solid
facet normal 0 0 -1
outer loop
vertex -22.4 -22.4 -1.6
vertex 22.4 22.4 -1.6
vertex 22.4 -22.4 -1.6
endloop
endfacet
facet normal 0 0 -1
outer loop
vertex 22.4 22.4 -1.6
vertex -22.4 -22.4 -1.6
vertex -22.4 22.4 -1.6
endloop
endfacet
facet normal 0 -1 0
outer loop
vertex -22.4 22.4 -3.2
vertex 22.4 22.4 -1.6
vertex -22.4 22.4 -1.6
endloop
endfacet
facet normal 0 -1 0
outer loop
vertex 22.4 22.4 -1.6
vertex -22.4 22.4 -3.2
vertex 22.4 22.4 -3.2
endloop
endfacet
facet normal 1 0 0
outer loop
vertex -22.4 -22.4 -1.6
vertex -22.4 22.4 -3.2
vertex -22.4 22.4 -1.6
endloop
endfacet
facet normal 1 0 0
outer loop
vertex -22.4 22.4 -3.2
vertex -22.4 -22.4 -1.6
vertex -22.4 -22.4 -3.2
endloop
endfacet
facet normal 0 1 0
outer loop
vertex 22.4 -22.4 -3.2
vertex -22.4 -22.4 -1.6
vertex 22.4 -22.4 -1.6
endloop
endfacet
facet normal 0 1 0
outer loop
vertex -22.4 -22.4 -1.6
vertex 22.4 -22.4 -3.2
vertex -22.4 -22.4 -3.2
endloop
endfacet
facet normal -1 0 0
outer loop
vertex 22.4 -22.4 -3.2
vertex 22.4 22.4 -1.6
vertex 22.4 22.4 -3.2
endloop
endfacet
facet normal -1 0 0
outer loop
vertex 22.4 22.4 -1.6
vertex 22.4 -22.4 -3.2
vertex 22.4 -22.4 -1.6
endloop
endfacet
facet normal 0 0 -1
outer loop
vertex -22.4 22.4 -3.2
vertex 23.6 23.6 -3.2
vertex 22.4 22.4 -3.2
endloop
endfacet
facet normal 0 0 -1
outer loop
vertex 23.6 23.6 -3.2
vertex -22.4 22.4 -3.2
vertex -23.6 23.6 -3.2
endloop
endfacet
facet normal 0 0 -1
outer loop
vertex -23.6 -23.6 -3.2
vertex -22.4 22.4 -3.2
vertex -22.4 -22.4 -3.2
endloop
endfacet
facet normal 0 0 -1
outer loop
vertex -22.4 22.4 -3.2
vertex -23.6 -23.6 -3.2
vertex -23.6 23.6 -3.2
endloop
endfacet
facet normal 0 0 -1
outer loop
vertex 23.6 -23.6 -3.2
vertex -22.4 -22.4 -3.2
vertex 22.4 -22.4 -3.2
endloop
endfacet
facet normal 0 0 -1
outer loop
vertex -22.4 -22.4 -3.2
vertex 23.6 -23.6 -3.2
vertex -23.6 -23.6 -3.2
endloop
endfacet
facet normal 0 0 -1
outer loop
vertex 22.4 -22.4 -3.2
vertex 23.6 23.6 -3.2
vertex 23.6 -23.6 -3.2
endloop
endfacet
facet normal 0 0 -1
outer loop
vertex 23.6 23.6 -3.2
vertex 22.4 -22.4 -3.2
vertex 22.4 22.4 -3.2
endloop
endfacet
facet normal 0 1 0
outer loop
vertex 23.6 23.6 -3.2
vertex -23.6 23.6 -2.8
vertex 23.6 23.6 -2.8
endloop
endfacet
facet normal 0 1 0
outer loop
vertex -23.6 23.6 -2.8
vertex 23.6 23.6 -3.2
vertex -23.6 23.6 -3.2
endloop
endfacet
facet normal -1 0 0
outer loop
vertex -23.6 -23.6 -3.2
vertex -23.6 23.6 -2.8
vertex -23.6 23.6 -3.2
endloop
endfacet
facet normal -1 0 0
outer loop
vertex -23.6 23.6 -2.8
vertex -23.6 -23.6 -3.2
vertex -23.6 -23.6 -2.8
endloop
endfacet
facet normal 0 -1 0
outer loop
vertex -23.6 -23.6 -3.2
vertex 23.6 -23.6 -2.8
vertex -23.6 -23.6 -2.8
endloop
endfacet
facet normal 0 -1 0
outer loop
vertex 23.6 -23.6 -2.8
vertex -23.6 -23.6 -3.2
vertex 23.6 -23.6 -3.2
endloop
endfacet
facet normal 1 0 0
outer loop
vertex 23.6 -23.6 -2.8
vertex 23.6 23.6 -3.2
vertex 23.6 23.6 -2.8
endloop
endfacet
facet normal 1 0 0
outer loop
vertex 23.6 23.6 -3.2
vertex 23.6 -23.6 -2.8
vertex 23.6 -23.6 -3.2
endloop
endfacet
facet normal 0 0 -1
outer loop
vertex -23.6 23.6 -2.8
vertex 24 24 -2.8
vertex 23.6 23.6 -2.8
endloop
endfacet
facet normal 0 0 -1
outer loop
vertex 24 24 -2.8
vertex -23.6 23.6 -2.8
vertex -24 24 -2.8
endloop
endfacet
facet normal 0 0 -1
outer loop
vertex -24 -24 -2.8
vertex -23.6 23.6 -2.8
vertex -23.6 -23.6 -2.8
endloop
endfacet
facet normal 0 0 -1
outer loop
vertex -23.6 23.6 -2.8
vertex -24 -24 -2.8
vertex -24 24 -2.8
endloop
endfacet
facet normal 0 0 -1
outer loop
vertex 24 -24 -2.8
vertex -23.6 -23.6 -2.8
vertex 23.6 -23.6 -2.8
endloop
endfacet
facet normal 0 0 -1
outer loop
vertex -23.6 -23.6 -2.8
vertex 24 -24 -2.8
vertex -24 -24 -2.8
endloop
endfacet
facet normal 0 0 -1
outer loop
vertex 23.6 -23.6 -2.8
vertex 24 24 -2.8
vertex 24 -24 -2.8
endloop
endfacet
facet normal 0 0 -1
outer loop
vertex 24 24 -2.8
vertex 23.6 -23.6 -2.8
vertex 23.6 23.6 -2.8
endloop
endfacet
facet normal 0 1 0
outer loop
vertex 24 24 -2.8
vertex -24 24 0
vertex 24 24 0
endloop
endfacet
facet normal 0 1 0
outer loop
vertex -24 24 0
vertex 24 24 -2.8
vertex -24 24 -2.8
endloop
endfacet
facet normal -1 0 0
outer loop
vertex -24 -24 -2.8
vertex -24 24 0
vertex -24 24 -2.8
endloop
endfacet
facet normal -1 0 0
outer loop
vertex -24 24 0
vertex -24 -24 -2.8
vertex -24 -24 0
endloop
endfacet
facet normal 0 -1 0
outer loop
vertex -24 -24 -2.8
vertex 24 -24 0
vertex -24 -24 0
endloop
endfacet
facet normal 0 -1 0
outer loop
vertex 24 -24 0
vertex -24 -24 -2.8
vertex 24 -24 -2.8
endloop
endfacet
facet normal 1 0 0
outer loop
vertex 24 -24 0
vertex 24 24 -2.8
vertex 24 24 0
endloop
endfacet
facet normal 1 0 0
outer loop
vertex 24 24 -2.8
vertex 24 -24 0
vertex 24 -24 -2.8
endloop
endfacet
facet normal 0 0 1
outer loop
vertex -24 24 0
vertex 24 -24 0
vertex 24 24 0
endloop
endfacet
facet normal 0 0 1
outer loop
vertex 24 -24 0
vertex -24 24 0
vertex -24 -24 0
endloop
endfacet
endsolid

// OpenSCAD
// file: ../p/box5.scad
use <../lib.scad>
function ldraw_lib__box5() = [
// 0 Box with 5 Faces and All Edges
// 0 Name: box5.dat
// 0 Author: James Jessiman
// 0 !LDRAW_ORG Primitive UPDATE 2012-01
// 0 !LICENSE Licensed under CC BY 4.0 : see CAreadme.txt
// 
// 0 BFC CERTIFY CCW
  [0,"BFC","CERTIFY"],
  [0,"BFC","CCW"],
// 
// 0 !HISTORY 2002-04-03 [sbliss] Modified for BFC compliance
// 0 !HISTORY 2002-04-25 [PTadmin] Official Update 2002-02
// 0 !HISTORY 2007-06-24 [PTadmin] Header formatted for Contributor Agreement
// 0 !HISTORY 2008-07-01 [PTadmin] Official Update 2008-01
// 0 !HISTORY 2012-02-16 [Philo] Changed to CCW
// 0 !HISTORY 2012-03-30 [PTadmin] Official Update 2012-01
// 
// 
// 2 24 1 1 1 -1 1 1
  [2,24,1,1,1,-1,1,1],
// 2 24 -1 1 1 -1 1 -1
  [2,24,-1,1,1,-1,1,-1],
// 2 24 -1 1 -1 1 1 -1
  [2,24,-1,1,-1,1,1,-1],
// 2 24 1 1 -1 1 1 1
  [2,24,1,1,-1,1,1,1],
// 2 24 1 0 1 -1 0 1
  [2,24,1,0,1,-1,0,1],
// 2 24 -1 0 1 -1 0 -1
  [2,24,-1,0,1,-1,0,-1],
// 2 24 -1 0 -1 1 0 -1
  [2,24,-1,0,-1,1,0,-1],
// 2 24 1 0 -1 1 0 1
  [2,24,1,0,-1,1,0,1],
// 2 24 1 0 1 1 1 1
  [2,24,1,0,1,1,1,1],
// 2 24 -1 0 1 -1 1 1
  [2,24,-1,0,1,-1,1,1],
// 2 24 1 0 -1 1 1 -1
  [2,24,1,0,-1,1,1,-1],
// 2 24 -1 0 -1 -1 1 -1
  [2,24,-1,0,-1,-1,1,-1],
// 4 16 -1 1 1 1 1 1 1 1 -1 -1 1 -1
  [4,16,-1,1,1,1,1,1,1,1,-1,-1,1,-1],
// 4 16 -1 1 1 -1 0 1 1 0 1 1 1 1
  [4,16,-1,1,1,-1,0,1,1,0,1,1,1,1],
// 4 16 -1 1 -1 -1 0 -1 -1 0 1 -1 1 1
  [4,16,-1,1,-1,-1,0,-1,-1,0,1,-1,1,1],
// 4 16 1 1 -1 1 0 -1 -1 0 -1 -1 1 -1
  [4,16,1,1,-1,1,0,-1,-1,0,-1,-1,1,-1],
// 4 16 1 1 1 1 0 1 1 0 -1 1 1 -1
  [4,16,1,1,1,1,0,1,1,0,-1,1,1,-1],
];
module ldraw_lib__box5(step=0, col=false, unit=2/5, alt=false, line=0.2, solid=!$preview)
    makepoly(ldraw_lib__box5(), step=step, col=col, unit=unit, alt=alt, line=line, solid=solid);
ldraw_lib__box5(line=0.2);
// file: ../p/box4.scad
use <../lib.scad>
function ldraw_lib__box4() = [
// 0 Box with 4 Faces (2 Parallel Pairs) and All Edges
// 0 Name: box4.dat
// 0 Author: James Jessiman
// 0 !LDRAW_ORG Primitive UPDATE 2012-01
// 0 !LICENSE Licensed under CC BY 4.0 : see CAreadme.txt
// 
// 0 BFC CERTIFY CCW
  [0,"BFC","CERTIFY"],
  [0,"BFC","CCW"],
// 
// 0 !HISTORY 2002-04-03 [sbliss] Modified for BFC compliance
// 0 !HISTORY 2002-04-25 [PTadmin] Official Update 2002-02
// 0 !HISTORY 2007-06-24 [PTadmin] Header formatted for Contributor Agreement
// 0 !HISTORY 2008-07-01 [PTadmin] Official Update 2008-01
// 0 !HISTORY 2012-02-16 [Philo] Changed to CCW
// 0 !HISTORY 2012-03-30 [PTadmin] Official Update 2012-01
// 
// 
// 2 24 1 1 1 -1 1 1
  [2,24,1,1,1,-1,1,1],
// 2 24 -1 1 1 -1 1 -1
  [2,24,-1,1,1,-1,1,-1],
// 2 24 -1 1 -1 1 1 -1
  [2,24,-1,1,-1,1,1,-1],
// 2 24 1 1 -1 1 1 1
  [2,24,1,1,-1,1,1,1],
// 2 24 1 0 1 -1 0 1
  [2,24,1,0,1,-1,0,1],
// 2 24 -1 0 1 -1 0 -1
  [2,24,-1,0,1,-1,0,-1],
// 2 24 -1 0 -1 1 0 -1
  [2,24,-1,0,-1,1,0,-1],
// 2 24 1 0 -1 1 0 1
  [2,24,1,0,-1,1,0,1],
// 2 24 1 0 1 1 1 1
  [2,24,1,0,1,1,1,1],
// 2 24 -1 0 1 -1 1 1
  [2,24,-1,0,1,-1,1,1],
// 2 24 1 0 -1 1 1 -1
  [2,24,1,0,-1,1,1,-1],
// 2 24 -1 0 -1 -1 1 -1
  [2,24,-1,0,-1,-1,1,-1],
// 4 16 -1 1 1 -1 0 1 1 0 1 1 1 1
  [4,16,-1,1,1,-1,0,1,1,0,1,1,1,1],
// 4 16 -1 1 -1 -1 0 -1 -1 0 1 -1 1 1
  [4,16,-1,1,-1,-1,0,-1,-1,0,1,-1,1,1],
// 4 16 1 1 -1 1 0 -1 -1 0 -1 -1 1 -1
  [4,16,1,1,-1,1,0,-1,-1,0,-1,-1,1,-1],
// 4 16 1 1 1 1 0 1 1 0 -1 1 1 -1
  [4,16,1,1,1,1,0,1,1,0,-1,1,1,-1],
];
module ldraw_lib__box4(step=0, col=false, unit=2/5, alt=false, line=0.2, solid=!$preview)
    makepoly(ldraw_lib__box4(), step=step, col=col, unit=unit, alt=alt, line=line, solid=solid);
ldraw_lib__box4(line=0.2);
// file: s/6881s01.scad
use <../../lib.scad>
use <../../p/box4.scad>
use <../../p/box5.scad>
function ldraw_lib__s__6881s01() = [
// 0 ~Tile  6 x  6 without Top Face
// 0 Name: s\6881s01.dat
// 0 Author: Philippe Hurbain [Philo]
// 0 !LDRAW_ORG Subpart UPDATE 2011-02
// 0 !LICENSE Licensed under CC BY 4.0 : see CAreadme.txt
// 
// 0 BFC CERTIFY CCW
  [0,"BFC","CERTIFY"],
  [0,"BFC","CCW"],
// 
// 0 !HISTORY 2011-12-29 [PTadmin] Official Update 2011-02
// 
// 
// 0 BFC INVERTNEXT
  [0,"BFC","INVERTNEXT"],
// 1 16 0 8 0 56 0 0 0 -4 0 0 0 56 box5.dat
  [1,16,0,8,0,56,0,0,0,-4,0,0,0,56, ldraw_lib__box5()],
// 4 16 59 8 59 56 8 56 -56 8 56 -59 8 59
  [4,16,59,8,59,56,8,56,-56,8,56,-59,8,59],
// 4 16 -59 8 59 -56 8 56 -56 8 -56 -59 8 -59
  [4,16,-59,8,59,-56,8,56,-56,8,-56,-59,8,-59],
// 4 16 -59 8 -59 -56 8 -56 56 8 -56 59 8 -59
  [4,16,-59,8,-59,-56,8,-56,56,8,-56,59,8,-59],
// 4 16 59 8 -59 56 8 -56 56 8 56 59 8 59
  [4,16,59,8,-59,56,8,-56,56,8,56,59,8,59],
// 1 16 0 8 0 59 0 0 0 -1 0 0 0 59 box4.dat
  [1,16,0,8,0,59,0,0,0,-1,0,0,0,59, ldraw_lib__box4()],
// 4 16 60 7 60 59 7 59 -59 7 59 -60 7 60
  [4,16,60,7,60,59,7,59,-59,7,59,-60,7,60],
// 4 16 -60 7 60 -59 7 59 -59 7 -59 -60 7 -60
  [4,16,-60,7,60,-59,7,59,-59,7,-59,-60,7,-60],
// 4 16 -60 7 -60 -59 7 -59 59 7 -59 60 7 -60
  [4,16,-60,7,-60,-59,7,-59,59,7,-59,60,7,-60],
// 4 16 60 7 -60 59 7 -59 59 7 59 60 7 60
  [4,16,60,7,-60,59,7,-59,59,7,59,60,7,60],
// 1 16 0 7 0 60 0 0 0 -7 0 0 0 60 box4.dat
  [1,16,0,7,0,60,0,0,0,-7,0,0,0,60, ldraw_lib__box4()],
// 0
];
module ldraw_lib__s__6881s01(step=0, col=false, unit=2/5, alt=false, line=0.2, solid=!$preview)
    makepoly(ldraw_lib__s__6881s01(), step=step, col=col, unit=unit, alt=alt, line=line, solid=solid);
ldraw_lib__s__6881s01(line=0.2);
// main file
use <../lib.scad>
use <s/6881s01.scad>
function ldraw_lib__6881a() = [
// 0 Tile  6 x  6 without Underside Details
// 0 Name: 6881a.dat
// 0 Author: Philippe Hurbain [Philo]
// 0 !LDRAW_ORG Part UPDATE 2011-02
// 0 !LICENSE Licensed under CC BY 4.0 : see CAreadme.txt
// 
// 0 BFC CERTIFY CCW
  [0,"BFC","CERTIFY"],
  [0,"BFC","CCW"],
// 
// 0 !KEYWORDS Scala
// 
// 0 !HISTORY 2011-12-29 [PTadmin] Official Update 2011-02
// 
// 
// 1 16 0 0 0 1 0 0 0 1 0 0 0 1 s\6881s01.dat
  [1,16,0,0,0,1,0,0,0,1,0,0,0,1, ldraw_lib__s__6881s01()],
// 4 16 -60 0 -60 60 0 -60 60 0 60 -60 0 60
  [4,16,-60,0,-60,60,0,-60,60,0,60,-60,0,60],
// 0
];
module ldraw_lib__6881a(step=0, col=false, unit=2/5, alt=false, line=0.2, solid=!$preview)
    makepoly(ldraw_lib__6881a(), step=step, col=col, unit=unit, alt=alt, line=line, solid=solid);
ldraw_lib__6881a(line=0.2);
